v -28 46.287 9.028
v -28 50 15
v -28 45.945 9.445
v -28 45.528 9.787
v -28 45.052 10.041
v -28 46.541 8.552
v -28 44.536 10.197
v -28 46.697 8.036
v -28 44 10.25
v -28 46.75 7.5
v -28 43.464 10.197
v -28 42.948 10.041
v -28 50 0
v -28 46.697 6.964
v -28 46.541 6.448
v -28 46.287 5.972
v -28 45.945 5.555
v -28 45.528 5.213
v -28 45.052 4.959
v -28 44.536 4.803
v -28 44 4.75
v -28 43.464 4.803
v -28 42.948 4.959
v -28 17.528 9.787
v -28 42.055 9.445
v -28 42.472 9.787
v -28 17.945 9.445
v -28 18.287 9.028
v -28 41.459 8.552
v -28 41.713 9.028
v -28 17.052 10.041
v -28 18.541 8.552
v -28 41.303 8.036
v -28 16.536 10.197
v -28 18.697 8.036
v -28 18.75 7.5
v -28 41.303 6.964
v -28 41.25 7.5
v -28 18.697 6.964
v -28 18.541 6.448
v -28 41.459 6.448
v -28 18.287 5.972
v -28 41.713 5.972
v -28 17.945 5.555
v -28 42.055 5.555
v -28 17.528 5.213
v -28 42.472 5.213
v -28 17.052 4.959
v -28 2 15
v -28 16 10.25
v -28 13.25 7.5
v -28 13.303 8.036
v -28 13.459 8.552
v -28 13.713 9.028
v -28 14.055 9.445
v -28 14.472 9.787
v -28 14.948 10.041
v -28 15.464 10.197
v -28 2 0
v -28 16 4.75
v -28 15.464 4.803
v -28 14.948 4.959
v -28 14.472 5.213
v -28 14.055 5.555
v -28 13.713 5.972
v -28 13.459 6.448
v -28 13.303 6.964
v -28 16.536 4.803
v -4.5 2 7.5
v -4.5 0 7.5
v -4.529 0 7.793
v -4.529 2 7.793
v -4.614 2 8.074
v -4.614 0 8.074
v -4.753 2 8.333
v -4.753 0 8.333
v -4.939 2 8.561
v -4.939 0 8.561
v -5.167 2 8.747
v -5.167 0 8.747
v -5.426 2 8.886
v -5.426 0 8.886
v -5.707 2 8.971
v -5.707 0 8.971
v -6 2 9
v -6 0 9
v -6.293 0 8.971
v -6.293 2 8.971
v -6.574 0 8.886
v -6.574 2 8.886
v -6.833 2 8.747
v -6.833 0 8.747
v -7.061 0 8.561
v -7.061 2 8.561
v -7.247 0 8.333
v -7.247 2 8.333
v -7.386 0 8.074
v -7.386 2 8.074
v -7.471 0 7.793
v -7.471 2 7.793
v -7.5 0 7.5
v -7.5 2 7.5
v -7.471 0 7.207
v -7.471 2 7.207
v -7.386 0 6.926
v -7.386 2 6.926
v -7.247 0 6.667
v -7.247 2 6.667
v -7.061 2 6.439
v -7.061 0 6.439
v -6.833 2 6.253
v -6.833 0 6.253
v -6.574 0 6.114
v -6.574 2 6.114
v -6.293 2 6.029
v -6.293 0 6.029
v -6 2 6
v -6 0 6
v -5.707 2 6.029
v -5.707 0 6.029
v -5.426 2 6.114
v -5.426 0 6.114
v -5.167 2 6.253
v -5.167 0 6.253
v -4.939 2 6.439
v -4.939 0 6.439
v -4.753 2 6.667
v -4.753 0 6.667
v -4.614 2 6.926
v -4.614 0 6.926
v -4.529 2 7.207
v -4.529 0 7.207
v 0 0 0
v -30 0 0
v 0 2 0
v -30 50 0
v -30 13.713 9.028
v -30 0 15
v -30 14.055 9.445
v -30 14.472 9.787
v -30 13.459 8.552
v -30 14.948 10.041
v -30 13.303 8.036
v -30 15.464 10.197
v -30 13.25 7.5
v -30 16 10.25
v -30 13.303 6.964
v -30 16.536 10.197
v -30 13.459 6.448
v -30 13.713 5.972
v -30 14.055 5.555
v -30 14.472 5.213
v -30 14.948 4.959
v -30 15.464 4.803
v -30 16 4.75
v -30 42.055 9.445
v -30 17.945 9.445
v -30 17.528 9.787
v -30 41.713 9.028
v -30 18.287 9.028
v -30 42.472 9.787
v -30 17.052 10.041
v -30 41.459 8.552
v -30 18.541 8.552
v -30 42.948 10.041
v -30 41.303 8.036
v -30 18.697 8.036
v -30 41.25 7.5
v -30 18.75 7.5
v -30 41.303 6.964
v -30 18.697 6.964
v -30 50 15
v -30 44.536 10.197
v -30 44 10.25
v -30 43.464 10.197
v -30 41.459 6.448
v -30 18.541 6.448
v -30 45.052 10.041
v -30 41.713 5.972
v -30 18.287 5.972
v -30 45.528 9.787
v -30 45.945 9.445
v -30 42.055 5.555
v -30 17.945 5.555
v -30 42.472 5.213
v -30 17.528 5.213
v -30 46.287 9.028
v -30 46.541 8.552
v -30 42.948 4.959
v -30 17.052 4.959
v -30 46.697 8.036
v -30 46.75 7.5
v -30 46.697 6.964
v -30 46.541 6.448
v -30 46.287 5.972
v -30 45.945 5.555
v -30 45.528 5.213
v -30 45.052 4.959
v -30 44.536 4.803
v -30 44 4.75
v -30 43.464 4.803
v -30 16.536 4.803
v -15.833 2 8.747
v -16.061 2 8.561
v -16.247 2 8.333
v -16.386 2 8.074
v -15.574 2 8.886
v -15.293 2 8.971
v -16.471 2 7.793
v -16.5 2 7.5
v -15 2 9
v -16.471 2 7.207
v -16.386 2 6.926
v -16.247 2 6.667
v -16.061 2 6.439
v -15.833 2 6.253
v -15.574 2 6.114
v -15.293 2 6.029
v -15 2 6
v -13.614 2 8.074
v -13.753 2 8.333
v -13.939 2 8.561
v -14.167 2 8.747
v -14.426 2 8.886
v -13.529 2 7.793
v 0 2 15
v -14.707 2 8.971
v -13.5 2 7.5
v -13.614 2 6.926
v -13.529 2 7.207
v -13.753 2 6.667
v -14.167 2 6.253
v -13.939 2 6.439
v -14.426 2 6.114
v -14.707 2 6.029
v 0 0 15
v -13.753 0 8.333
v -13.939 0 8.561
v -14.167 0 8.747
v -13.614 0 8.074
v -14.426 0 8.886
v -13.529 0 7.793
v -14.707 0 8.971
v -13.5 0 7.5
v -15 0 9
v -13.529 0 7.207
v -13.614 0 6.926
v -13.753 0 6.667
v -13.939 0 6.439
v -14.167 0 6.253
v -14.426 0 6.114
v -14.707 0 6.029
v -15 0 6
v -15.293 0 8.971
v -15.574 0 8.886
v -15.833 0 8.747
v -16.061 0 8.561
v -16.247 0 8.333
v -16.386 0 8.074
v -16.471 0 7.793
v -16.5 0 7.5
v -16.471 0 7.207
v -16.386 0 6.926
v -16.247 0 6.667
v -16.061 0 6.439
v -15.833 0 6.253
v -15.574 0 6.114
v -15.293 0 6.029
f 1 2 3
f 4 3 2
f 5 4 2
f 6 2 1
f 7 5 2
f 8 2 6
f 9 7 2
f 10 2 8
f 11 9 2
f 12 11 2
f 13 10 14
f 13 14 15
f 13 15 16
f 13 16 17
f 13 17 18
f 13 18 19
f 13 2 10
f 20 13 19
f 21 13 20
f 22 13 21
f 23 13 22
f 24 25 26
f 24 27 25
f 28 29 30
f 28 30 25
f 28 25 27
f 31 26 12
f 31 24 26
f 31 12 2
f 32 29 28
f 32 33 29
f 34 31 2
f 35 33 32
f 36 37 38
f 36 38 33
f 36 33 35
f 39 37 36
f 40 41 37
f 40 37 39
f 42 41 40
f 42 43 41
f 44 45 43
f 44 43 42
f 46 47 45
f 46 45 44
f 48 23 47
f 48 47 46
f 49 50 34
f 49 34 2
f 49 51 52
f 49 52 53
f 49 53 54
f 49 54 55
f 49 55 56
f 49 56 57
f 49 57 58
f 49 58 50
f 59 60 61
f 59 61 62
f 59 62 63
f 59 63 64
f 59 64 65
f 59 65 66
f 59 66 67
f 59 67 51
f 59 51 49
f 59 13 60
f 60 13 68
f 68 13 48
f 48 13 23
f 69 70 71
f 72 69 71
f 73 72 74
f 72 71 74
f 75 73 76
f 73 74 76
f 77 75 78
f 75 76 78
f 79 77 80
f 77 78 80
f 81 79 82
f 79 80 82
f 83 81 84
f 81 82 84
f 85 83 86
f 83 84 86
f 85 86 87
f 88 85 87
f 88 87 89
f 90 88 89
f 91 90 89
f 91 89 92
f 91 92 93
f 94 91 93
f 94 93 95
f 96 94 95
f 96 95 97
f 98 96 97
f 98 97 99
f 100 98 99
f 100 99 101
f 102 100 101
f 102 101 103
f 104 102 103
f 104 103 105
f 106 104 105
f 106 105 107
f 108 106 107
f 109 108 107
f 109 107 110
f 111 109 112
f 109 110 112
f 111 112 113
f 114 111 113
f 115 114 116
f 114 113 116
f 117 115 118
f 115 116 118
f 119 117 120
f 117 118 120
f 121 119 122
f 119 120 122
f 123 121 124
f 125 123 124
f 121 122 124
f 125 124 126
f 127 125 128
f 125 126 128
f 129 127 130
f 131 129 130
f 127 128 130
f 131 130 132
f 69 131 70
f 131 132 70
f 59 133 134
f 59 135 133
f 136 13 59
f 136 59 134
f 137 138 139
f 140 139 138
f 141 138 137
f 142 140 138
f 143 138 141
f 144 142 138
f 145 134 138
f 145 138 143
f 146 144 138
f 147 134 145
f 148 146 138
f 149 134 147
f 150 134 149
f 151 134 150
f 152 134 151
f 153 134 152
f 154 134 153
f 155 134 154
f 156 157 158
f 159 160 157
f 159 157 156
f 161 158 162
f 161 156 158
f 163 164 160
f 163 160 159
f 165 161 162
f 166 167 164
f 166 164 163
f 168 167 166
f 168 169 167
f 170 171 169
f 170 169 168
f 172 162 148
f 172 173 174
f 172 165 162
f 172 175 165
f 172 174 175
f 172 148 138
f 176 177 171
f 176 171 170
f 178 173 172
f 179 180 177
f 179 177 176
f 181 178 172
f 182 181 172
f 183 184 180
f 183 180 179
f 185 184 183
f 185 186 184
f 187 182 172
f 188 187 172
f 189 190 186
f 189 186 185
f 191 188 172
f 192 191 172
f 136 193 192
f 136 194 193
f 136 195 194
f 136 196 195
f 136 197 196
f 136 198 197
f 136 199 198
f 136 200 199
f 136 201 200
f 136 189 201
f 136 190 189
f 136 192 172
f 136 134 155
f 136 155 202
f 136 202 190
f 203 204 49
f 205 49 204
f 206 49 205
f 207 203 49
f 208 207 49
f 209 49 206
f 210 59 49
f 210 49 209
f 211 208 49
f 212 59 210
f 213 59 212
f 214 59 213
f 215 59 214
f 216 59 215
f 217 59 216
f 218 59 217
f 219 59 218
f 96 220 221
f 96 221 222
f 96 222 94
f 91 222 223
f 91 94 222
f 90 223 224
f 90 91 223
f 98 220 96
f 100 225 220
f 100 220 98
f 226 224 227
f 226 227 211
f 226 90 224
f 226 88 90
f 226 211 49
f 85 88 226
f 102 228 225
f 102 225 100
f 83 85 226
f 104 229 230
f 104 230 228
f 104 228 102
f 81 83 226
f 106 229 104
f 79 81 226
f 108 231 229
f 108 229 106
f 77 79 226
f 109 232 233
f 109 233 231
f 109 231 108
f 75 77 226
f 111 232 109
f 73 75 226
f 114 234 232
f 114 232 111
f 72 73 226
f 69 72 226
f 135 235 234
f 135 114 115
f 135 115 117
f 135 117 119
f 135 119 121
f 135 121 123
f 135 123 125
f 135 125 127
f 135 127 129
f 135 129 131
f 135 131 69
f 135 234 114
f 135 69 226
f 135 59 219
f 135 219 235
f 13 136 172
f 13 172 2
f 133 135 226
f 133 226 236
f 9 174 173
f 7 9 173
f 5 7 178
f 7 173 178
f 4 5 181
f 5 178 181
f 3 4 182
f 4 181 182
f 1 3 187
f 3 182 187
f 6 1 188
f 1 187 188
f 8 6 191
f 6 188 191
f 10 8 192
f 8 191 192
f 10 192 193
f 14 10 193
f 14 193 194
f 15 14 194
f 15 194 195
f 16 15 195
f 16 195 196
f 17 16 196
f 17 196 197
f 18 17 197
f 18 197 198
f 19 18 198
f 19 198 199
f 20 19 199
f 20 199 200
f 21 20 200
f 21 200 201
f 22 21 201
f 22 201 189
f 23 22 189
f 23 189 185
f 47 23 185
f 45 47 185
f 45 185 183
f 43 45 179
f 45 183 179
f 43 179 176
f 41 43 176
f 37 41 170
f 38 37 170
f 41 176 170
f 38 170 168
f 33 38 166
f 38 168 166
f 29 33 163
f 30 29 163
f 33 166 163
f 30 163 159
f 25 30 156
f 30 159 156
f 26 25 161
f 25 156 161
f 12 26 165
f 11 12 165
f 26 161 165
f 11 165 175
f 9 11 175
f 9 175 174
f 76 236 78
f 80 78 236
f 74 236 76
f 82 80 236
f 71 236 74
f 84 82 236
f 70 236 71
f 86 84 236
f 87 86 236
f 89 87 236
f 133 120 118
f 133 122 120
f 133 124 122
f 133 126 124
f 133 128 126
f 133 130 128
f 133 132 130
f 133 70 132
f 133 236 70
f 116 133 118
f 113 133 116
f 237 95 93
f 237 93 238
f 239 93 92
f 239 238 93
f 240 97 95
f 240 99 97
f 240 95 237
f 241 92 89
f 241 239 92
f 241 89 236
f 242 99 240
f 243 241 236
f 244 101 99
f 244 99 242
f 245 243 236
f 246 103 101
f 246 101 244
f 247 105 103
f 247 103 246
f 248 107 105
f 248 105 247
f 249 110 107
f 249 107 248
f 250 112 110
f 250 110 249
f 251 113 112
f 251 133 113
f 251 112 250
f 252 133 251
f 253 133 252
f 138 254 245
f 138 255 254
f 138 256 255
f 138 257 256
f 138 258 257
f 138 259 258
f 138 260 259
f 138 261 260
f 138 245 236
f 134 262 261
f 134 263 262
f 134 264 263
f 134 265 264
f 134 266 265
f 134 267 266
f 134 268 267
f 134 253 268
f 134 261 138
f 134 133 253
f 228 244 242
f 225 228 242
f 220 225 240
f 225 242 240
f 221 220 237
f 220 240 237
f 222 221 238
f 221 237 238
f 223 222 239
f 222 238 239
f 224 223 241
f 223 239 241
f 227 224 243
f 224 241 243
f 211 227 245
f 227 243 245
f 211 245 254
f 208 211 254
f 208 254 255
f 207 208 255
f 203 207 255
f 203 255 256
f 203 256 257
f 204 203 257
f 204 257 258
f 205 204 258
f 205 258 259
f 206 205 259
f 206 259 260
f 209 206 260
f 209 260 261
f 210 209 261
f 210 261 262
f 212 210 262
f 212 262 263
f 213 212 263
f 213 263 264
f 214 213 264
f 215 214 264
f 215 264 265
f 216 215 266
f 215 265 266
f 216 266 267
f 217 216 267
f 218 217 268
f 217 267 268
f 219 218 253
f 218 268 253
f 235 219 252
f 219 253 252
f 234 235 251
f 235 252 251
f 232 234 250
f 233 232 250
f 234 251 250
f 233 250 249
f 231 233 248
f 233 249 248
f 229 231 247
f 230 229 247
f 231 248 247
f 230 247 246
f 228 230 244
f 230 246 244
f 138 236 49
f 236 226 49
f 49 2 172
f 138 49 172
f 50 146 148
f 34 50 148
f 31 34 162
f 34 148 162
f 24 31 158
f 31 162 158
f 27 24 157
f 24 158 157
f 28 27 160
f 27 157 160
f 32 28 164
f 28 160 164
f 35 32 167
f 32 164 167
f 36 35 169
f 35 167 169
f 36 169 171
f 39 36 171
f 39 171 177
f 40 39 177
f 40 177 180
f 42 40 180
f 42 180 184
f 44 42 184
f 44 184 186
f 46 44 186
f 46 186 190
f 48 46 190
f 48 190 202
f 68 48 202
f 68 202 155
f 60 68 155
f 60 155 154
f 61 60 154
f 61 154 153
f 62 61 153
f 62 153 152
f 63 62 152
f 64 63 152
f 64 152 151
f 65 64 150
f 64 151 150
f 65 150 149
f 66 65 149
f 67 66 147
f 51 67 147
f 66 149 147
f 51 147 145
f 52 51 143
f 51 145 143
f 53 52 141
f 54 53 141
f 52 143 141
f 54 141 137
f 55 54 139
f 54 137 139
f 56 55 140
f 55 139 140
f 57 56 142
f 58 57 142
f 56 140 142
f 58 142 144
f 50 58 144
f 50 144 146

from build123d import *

# Parameters (mm, degrees)
ESTRUSIONE_ESTRUSIONE1_DEPTH = 15
SCHIZZO2_R                   = 2.75
TAGLIO_ESTRUSIONE1_DEPTH     = 15
SCHIZZO3_R                   = 1.5
TAGLIO_ESTRUSIONE2_DEPTH     = 15


with BuildPart() as part:
    # Schizzo1 → Estrusione-Estrusione1 (new body)
    with BuildSketch(Plane.XY):
        Polygon((0, 0), (-30, 0), (-30, 50), (-28, 50), (-28, 2), (0, 2), align=None)
    extrude(amount=ESTRUSIONE_ESTRUSIONE1_DEPTH)

    # Schizzo2 → Taglio-Estrusione1 (cut)
    with BuildSketch(Plane.ZY.offset(30)):
        with Locations((7.5, 44)):
            Circle(SCHIZZO2_R)
        with Locations((7.5, 16)):
            Circle(SCHIZZO2_R)
    extrude(amount=-TAGLIO_ESTRUSIONE1_DEPTH, mode=Mode.SUBTRACT)

    # Schizzo3 → Taglio-Estrusione2 (cut)
    with BuildSketch(Plane.XZ):
        with Locations((-6, 7.5)):
            Circle(SCHIZZO3_R)
        with Locations((-15, 7.5)):
            Circle(SCHIZZO3_R)
    extrude(amount=-TAGLIO_ESTRUSIONE2_DEPTH, mode=Mode.SUBTRACT)


solid = part.part
